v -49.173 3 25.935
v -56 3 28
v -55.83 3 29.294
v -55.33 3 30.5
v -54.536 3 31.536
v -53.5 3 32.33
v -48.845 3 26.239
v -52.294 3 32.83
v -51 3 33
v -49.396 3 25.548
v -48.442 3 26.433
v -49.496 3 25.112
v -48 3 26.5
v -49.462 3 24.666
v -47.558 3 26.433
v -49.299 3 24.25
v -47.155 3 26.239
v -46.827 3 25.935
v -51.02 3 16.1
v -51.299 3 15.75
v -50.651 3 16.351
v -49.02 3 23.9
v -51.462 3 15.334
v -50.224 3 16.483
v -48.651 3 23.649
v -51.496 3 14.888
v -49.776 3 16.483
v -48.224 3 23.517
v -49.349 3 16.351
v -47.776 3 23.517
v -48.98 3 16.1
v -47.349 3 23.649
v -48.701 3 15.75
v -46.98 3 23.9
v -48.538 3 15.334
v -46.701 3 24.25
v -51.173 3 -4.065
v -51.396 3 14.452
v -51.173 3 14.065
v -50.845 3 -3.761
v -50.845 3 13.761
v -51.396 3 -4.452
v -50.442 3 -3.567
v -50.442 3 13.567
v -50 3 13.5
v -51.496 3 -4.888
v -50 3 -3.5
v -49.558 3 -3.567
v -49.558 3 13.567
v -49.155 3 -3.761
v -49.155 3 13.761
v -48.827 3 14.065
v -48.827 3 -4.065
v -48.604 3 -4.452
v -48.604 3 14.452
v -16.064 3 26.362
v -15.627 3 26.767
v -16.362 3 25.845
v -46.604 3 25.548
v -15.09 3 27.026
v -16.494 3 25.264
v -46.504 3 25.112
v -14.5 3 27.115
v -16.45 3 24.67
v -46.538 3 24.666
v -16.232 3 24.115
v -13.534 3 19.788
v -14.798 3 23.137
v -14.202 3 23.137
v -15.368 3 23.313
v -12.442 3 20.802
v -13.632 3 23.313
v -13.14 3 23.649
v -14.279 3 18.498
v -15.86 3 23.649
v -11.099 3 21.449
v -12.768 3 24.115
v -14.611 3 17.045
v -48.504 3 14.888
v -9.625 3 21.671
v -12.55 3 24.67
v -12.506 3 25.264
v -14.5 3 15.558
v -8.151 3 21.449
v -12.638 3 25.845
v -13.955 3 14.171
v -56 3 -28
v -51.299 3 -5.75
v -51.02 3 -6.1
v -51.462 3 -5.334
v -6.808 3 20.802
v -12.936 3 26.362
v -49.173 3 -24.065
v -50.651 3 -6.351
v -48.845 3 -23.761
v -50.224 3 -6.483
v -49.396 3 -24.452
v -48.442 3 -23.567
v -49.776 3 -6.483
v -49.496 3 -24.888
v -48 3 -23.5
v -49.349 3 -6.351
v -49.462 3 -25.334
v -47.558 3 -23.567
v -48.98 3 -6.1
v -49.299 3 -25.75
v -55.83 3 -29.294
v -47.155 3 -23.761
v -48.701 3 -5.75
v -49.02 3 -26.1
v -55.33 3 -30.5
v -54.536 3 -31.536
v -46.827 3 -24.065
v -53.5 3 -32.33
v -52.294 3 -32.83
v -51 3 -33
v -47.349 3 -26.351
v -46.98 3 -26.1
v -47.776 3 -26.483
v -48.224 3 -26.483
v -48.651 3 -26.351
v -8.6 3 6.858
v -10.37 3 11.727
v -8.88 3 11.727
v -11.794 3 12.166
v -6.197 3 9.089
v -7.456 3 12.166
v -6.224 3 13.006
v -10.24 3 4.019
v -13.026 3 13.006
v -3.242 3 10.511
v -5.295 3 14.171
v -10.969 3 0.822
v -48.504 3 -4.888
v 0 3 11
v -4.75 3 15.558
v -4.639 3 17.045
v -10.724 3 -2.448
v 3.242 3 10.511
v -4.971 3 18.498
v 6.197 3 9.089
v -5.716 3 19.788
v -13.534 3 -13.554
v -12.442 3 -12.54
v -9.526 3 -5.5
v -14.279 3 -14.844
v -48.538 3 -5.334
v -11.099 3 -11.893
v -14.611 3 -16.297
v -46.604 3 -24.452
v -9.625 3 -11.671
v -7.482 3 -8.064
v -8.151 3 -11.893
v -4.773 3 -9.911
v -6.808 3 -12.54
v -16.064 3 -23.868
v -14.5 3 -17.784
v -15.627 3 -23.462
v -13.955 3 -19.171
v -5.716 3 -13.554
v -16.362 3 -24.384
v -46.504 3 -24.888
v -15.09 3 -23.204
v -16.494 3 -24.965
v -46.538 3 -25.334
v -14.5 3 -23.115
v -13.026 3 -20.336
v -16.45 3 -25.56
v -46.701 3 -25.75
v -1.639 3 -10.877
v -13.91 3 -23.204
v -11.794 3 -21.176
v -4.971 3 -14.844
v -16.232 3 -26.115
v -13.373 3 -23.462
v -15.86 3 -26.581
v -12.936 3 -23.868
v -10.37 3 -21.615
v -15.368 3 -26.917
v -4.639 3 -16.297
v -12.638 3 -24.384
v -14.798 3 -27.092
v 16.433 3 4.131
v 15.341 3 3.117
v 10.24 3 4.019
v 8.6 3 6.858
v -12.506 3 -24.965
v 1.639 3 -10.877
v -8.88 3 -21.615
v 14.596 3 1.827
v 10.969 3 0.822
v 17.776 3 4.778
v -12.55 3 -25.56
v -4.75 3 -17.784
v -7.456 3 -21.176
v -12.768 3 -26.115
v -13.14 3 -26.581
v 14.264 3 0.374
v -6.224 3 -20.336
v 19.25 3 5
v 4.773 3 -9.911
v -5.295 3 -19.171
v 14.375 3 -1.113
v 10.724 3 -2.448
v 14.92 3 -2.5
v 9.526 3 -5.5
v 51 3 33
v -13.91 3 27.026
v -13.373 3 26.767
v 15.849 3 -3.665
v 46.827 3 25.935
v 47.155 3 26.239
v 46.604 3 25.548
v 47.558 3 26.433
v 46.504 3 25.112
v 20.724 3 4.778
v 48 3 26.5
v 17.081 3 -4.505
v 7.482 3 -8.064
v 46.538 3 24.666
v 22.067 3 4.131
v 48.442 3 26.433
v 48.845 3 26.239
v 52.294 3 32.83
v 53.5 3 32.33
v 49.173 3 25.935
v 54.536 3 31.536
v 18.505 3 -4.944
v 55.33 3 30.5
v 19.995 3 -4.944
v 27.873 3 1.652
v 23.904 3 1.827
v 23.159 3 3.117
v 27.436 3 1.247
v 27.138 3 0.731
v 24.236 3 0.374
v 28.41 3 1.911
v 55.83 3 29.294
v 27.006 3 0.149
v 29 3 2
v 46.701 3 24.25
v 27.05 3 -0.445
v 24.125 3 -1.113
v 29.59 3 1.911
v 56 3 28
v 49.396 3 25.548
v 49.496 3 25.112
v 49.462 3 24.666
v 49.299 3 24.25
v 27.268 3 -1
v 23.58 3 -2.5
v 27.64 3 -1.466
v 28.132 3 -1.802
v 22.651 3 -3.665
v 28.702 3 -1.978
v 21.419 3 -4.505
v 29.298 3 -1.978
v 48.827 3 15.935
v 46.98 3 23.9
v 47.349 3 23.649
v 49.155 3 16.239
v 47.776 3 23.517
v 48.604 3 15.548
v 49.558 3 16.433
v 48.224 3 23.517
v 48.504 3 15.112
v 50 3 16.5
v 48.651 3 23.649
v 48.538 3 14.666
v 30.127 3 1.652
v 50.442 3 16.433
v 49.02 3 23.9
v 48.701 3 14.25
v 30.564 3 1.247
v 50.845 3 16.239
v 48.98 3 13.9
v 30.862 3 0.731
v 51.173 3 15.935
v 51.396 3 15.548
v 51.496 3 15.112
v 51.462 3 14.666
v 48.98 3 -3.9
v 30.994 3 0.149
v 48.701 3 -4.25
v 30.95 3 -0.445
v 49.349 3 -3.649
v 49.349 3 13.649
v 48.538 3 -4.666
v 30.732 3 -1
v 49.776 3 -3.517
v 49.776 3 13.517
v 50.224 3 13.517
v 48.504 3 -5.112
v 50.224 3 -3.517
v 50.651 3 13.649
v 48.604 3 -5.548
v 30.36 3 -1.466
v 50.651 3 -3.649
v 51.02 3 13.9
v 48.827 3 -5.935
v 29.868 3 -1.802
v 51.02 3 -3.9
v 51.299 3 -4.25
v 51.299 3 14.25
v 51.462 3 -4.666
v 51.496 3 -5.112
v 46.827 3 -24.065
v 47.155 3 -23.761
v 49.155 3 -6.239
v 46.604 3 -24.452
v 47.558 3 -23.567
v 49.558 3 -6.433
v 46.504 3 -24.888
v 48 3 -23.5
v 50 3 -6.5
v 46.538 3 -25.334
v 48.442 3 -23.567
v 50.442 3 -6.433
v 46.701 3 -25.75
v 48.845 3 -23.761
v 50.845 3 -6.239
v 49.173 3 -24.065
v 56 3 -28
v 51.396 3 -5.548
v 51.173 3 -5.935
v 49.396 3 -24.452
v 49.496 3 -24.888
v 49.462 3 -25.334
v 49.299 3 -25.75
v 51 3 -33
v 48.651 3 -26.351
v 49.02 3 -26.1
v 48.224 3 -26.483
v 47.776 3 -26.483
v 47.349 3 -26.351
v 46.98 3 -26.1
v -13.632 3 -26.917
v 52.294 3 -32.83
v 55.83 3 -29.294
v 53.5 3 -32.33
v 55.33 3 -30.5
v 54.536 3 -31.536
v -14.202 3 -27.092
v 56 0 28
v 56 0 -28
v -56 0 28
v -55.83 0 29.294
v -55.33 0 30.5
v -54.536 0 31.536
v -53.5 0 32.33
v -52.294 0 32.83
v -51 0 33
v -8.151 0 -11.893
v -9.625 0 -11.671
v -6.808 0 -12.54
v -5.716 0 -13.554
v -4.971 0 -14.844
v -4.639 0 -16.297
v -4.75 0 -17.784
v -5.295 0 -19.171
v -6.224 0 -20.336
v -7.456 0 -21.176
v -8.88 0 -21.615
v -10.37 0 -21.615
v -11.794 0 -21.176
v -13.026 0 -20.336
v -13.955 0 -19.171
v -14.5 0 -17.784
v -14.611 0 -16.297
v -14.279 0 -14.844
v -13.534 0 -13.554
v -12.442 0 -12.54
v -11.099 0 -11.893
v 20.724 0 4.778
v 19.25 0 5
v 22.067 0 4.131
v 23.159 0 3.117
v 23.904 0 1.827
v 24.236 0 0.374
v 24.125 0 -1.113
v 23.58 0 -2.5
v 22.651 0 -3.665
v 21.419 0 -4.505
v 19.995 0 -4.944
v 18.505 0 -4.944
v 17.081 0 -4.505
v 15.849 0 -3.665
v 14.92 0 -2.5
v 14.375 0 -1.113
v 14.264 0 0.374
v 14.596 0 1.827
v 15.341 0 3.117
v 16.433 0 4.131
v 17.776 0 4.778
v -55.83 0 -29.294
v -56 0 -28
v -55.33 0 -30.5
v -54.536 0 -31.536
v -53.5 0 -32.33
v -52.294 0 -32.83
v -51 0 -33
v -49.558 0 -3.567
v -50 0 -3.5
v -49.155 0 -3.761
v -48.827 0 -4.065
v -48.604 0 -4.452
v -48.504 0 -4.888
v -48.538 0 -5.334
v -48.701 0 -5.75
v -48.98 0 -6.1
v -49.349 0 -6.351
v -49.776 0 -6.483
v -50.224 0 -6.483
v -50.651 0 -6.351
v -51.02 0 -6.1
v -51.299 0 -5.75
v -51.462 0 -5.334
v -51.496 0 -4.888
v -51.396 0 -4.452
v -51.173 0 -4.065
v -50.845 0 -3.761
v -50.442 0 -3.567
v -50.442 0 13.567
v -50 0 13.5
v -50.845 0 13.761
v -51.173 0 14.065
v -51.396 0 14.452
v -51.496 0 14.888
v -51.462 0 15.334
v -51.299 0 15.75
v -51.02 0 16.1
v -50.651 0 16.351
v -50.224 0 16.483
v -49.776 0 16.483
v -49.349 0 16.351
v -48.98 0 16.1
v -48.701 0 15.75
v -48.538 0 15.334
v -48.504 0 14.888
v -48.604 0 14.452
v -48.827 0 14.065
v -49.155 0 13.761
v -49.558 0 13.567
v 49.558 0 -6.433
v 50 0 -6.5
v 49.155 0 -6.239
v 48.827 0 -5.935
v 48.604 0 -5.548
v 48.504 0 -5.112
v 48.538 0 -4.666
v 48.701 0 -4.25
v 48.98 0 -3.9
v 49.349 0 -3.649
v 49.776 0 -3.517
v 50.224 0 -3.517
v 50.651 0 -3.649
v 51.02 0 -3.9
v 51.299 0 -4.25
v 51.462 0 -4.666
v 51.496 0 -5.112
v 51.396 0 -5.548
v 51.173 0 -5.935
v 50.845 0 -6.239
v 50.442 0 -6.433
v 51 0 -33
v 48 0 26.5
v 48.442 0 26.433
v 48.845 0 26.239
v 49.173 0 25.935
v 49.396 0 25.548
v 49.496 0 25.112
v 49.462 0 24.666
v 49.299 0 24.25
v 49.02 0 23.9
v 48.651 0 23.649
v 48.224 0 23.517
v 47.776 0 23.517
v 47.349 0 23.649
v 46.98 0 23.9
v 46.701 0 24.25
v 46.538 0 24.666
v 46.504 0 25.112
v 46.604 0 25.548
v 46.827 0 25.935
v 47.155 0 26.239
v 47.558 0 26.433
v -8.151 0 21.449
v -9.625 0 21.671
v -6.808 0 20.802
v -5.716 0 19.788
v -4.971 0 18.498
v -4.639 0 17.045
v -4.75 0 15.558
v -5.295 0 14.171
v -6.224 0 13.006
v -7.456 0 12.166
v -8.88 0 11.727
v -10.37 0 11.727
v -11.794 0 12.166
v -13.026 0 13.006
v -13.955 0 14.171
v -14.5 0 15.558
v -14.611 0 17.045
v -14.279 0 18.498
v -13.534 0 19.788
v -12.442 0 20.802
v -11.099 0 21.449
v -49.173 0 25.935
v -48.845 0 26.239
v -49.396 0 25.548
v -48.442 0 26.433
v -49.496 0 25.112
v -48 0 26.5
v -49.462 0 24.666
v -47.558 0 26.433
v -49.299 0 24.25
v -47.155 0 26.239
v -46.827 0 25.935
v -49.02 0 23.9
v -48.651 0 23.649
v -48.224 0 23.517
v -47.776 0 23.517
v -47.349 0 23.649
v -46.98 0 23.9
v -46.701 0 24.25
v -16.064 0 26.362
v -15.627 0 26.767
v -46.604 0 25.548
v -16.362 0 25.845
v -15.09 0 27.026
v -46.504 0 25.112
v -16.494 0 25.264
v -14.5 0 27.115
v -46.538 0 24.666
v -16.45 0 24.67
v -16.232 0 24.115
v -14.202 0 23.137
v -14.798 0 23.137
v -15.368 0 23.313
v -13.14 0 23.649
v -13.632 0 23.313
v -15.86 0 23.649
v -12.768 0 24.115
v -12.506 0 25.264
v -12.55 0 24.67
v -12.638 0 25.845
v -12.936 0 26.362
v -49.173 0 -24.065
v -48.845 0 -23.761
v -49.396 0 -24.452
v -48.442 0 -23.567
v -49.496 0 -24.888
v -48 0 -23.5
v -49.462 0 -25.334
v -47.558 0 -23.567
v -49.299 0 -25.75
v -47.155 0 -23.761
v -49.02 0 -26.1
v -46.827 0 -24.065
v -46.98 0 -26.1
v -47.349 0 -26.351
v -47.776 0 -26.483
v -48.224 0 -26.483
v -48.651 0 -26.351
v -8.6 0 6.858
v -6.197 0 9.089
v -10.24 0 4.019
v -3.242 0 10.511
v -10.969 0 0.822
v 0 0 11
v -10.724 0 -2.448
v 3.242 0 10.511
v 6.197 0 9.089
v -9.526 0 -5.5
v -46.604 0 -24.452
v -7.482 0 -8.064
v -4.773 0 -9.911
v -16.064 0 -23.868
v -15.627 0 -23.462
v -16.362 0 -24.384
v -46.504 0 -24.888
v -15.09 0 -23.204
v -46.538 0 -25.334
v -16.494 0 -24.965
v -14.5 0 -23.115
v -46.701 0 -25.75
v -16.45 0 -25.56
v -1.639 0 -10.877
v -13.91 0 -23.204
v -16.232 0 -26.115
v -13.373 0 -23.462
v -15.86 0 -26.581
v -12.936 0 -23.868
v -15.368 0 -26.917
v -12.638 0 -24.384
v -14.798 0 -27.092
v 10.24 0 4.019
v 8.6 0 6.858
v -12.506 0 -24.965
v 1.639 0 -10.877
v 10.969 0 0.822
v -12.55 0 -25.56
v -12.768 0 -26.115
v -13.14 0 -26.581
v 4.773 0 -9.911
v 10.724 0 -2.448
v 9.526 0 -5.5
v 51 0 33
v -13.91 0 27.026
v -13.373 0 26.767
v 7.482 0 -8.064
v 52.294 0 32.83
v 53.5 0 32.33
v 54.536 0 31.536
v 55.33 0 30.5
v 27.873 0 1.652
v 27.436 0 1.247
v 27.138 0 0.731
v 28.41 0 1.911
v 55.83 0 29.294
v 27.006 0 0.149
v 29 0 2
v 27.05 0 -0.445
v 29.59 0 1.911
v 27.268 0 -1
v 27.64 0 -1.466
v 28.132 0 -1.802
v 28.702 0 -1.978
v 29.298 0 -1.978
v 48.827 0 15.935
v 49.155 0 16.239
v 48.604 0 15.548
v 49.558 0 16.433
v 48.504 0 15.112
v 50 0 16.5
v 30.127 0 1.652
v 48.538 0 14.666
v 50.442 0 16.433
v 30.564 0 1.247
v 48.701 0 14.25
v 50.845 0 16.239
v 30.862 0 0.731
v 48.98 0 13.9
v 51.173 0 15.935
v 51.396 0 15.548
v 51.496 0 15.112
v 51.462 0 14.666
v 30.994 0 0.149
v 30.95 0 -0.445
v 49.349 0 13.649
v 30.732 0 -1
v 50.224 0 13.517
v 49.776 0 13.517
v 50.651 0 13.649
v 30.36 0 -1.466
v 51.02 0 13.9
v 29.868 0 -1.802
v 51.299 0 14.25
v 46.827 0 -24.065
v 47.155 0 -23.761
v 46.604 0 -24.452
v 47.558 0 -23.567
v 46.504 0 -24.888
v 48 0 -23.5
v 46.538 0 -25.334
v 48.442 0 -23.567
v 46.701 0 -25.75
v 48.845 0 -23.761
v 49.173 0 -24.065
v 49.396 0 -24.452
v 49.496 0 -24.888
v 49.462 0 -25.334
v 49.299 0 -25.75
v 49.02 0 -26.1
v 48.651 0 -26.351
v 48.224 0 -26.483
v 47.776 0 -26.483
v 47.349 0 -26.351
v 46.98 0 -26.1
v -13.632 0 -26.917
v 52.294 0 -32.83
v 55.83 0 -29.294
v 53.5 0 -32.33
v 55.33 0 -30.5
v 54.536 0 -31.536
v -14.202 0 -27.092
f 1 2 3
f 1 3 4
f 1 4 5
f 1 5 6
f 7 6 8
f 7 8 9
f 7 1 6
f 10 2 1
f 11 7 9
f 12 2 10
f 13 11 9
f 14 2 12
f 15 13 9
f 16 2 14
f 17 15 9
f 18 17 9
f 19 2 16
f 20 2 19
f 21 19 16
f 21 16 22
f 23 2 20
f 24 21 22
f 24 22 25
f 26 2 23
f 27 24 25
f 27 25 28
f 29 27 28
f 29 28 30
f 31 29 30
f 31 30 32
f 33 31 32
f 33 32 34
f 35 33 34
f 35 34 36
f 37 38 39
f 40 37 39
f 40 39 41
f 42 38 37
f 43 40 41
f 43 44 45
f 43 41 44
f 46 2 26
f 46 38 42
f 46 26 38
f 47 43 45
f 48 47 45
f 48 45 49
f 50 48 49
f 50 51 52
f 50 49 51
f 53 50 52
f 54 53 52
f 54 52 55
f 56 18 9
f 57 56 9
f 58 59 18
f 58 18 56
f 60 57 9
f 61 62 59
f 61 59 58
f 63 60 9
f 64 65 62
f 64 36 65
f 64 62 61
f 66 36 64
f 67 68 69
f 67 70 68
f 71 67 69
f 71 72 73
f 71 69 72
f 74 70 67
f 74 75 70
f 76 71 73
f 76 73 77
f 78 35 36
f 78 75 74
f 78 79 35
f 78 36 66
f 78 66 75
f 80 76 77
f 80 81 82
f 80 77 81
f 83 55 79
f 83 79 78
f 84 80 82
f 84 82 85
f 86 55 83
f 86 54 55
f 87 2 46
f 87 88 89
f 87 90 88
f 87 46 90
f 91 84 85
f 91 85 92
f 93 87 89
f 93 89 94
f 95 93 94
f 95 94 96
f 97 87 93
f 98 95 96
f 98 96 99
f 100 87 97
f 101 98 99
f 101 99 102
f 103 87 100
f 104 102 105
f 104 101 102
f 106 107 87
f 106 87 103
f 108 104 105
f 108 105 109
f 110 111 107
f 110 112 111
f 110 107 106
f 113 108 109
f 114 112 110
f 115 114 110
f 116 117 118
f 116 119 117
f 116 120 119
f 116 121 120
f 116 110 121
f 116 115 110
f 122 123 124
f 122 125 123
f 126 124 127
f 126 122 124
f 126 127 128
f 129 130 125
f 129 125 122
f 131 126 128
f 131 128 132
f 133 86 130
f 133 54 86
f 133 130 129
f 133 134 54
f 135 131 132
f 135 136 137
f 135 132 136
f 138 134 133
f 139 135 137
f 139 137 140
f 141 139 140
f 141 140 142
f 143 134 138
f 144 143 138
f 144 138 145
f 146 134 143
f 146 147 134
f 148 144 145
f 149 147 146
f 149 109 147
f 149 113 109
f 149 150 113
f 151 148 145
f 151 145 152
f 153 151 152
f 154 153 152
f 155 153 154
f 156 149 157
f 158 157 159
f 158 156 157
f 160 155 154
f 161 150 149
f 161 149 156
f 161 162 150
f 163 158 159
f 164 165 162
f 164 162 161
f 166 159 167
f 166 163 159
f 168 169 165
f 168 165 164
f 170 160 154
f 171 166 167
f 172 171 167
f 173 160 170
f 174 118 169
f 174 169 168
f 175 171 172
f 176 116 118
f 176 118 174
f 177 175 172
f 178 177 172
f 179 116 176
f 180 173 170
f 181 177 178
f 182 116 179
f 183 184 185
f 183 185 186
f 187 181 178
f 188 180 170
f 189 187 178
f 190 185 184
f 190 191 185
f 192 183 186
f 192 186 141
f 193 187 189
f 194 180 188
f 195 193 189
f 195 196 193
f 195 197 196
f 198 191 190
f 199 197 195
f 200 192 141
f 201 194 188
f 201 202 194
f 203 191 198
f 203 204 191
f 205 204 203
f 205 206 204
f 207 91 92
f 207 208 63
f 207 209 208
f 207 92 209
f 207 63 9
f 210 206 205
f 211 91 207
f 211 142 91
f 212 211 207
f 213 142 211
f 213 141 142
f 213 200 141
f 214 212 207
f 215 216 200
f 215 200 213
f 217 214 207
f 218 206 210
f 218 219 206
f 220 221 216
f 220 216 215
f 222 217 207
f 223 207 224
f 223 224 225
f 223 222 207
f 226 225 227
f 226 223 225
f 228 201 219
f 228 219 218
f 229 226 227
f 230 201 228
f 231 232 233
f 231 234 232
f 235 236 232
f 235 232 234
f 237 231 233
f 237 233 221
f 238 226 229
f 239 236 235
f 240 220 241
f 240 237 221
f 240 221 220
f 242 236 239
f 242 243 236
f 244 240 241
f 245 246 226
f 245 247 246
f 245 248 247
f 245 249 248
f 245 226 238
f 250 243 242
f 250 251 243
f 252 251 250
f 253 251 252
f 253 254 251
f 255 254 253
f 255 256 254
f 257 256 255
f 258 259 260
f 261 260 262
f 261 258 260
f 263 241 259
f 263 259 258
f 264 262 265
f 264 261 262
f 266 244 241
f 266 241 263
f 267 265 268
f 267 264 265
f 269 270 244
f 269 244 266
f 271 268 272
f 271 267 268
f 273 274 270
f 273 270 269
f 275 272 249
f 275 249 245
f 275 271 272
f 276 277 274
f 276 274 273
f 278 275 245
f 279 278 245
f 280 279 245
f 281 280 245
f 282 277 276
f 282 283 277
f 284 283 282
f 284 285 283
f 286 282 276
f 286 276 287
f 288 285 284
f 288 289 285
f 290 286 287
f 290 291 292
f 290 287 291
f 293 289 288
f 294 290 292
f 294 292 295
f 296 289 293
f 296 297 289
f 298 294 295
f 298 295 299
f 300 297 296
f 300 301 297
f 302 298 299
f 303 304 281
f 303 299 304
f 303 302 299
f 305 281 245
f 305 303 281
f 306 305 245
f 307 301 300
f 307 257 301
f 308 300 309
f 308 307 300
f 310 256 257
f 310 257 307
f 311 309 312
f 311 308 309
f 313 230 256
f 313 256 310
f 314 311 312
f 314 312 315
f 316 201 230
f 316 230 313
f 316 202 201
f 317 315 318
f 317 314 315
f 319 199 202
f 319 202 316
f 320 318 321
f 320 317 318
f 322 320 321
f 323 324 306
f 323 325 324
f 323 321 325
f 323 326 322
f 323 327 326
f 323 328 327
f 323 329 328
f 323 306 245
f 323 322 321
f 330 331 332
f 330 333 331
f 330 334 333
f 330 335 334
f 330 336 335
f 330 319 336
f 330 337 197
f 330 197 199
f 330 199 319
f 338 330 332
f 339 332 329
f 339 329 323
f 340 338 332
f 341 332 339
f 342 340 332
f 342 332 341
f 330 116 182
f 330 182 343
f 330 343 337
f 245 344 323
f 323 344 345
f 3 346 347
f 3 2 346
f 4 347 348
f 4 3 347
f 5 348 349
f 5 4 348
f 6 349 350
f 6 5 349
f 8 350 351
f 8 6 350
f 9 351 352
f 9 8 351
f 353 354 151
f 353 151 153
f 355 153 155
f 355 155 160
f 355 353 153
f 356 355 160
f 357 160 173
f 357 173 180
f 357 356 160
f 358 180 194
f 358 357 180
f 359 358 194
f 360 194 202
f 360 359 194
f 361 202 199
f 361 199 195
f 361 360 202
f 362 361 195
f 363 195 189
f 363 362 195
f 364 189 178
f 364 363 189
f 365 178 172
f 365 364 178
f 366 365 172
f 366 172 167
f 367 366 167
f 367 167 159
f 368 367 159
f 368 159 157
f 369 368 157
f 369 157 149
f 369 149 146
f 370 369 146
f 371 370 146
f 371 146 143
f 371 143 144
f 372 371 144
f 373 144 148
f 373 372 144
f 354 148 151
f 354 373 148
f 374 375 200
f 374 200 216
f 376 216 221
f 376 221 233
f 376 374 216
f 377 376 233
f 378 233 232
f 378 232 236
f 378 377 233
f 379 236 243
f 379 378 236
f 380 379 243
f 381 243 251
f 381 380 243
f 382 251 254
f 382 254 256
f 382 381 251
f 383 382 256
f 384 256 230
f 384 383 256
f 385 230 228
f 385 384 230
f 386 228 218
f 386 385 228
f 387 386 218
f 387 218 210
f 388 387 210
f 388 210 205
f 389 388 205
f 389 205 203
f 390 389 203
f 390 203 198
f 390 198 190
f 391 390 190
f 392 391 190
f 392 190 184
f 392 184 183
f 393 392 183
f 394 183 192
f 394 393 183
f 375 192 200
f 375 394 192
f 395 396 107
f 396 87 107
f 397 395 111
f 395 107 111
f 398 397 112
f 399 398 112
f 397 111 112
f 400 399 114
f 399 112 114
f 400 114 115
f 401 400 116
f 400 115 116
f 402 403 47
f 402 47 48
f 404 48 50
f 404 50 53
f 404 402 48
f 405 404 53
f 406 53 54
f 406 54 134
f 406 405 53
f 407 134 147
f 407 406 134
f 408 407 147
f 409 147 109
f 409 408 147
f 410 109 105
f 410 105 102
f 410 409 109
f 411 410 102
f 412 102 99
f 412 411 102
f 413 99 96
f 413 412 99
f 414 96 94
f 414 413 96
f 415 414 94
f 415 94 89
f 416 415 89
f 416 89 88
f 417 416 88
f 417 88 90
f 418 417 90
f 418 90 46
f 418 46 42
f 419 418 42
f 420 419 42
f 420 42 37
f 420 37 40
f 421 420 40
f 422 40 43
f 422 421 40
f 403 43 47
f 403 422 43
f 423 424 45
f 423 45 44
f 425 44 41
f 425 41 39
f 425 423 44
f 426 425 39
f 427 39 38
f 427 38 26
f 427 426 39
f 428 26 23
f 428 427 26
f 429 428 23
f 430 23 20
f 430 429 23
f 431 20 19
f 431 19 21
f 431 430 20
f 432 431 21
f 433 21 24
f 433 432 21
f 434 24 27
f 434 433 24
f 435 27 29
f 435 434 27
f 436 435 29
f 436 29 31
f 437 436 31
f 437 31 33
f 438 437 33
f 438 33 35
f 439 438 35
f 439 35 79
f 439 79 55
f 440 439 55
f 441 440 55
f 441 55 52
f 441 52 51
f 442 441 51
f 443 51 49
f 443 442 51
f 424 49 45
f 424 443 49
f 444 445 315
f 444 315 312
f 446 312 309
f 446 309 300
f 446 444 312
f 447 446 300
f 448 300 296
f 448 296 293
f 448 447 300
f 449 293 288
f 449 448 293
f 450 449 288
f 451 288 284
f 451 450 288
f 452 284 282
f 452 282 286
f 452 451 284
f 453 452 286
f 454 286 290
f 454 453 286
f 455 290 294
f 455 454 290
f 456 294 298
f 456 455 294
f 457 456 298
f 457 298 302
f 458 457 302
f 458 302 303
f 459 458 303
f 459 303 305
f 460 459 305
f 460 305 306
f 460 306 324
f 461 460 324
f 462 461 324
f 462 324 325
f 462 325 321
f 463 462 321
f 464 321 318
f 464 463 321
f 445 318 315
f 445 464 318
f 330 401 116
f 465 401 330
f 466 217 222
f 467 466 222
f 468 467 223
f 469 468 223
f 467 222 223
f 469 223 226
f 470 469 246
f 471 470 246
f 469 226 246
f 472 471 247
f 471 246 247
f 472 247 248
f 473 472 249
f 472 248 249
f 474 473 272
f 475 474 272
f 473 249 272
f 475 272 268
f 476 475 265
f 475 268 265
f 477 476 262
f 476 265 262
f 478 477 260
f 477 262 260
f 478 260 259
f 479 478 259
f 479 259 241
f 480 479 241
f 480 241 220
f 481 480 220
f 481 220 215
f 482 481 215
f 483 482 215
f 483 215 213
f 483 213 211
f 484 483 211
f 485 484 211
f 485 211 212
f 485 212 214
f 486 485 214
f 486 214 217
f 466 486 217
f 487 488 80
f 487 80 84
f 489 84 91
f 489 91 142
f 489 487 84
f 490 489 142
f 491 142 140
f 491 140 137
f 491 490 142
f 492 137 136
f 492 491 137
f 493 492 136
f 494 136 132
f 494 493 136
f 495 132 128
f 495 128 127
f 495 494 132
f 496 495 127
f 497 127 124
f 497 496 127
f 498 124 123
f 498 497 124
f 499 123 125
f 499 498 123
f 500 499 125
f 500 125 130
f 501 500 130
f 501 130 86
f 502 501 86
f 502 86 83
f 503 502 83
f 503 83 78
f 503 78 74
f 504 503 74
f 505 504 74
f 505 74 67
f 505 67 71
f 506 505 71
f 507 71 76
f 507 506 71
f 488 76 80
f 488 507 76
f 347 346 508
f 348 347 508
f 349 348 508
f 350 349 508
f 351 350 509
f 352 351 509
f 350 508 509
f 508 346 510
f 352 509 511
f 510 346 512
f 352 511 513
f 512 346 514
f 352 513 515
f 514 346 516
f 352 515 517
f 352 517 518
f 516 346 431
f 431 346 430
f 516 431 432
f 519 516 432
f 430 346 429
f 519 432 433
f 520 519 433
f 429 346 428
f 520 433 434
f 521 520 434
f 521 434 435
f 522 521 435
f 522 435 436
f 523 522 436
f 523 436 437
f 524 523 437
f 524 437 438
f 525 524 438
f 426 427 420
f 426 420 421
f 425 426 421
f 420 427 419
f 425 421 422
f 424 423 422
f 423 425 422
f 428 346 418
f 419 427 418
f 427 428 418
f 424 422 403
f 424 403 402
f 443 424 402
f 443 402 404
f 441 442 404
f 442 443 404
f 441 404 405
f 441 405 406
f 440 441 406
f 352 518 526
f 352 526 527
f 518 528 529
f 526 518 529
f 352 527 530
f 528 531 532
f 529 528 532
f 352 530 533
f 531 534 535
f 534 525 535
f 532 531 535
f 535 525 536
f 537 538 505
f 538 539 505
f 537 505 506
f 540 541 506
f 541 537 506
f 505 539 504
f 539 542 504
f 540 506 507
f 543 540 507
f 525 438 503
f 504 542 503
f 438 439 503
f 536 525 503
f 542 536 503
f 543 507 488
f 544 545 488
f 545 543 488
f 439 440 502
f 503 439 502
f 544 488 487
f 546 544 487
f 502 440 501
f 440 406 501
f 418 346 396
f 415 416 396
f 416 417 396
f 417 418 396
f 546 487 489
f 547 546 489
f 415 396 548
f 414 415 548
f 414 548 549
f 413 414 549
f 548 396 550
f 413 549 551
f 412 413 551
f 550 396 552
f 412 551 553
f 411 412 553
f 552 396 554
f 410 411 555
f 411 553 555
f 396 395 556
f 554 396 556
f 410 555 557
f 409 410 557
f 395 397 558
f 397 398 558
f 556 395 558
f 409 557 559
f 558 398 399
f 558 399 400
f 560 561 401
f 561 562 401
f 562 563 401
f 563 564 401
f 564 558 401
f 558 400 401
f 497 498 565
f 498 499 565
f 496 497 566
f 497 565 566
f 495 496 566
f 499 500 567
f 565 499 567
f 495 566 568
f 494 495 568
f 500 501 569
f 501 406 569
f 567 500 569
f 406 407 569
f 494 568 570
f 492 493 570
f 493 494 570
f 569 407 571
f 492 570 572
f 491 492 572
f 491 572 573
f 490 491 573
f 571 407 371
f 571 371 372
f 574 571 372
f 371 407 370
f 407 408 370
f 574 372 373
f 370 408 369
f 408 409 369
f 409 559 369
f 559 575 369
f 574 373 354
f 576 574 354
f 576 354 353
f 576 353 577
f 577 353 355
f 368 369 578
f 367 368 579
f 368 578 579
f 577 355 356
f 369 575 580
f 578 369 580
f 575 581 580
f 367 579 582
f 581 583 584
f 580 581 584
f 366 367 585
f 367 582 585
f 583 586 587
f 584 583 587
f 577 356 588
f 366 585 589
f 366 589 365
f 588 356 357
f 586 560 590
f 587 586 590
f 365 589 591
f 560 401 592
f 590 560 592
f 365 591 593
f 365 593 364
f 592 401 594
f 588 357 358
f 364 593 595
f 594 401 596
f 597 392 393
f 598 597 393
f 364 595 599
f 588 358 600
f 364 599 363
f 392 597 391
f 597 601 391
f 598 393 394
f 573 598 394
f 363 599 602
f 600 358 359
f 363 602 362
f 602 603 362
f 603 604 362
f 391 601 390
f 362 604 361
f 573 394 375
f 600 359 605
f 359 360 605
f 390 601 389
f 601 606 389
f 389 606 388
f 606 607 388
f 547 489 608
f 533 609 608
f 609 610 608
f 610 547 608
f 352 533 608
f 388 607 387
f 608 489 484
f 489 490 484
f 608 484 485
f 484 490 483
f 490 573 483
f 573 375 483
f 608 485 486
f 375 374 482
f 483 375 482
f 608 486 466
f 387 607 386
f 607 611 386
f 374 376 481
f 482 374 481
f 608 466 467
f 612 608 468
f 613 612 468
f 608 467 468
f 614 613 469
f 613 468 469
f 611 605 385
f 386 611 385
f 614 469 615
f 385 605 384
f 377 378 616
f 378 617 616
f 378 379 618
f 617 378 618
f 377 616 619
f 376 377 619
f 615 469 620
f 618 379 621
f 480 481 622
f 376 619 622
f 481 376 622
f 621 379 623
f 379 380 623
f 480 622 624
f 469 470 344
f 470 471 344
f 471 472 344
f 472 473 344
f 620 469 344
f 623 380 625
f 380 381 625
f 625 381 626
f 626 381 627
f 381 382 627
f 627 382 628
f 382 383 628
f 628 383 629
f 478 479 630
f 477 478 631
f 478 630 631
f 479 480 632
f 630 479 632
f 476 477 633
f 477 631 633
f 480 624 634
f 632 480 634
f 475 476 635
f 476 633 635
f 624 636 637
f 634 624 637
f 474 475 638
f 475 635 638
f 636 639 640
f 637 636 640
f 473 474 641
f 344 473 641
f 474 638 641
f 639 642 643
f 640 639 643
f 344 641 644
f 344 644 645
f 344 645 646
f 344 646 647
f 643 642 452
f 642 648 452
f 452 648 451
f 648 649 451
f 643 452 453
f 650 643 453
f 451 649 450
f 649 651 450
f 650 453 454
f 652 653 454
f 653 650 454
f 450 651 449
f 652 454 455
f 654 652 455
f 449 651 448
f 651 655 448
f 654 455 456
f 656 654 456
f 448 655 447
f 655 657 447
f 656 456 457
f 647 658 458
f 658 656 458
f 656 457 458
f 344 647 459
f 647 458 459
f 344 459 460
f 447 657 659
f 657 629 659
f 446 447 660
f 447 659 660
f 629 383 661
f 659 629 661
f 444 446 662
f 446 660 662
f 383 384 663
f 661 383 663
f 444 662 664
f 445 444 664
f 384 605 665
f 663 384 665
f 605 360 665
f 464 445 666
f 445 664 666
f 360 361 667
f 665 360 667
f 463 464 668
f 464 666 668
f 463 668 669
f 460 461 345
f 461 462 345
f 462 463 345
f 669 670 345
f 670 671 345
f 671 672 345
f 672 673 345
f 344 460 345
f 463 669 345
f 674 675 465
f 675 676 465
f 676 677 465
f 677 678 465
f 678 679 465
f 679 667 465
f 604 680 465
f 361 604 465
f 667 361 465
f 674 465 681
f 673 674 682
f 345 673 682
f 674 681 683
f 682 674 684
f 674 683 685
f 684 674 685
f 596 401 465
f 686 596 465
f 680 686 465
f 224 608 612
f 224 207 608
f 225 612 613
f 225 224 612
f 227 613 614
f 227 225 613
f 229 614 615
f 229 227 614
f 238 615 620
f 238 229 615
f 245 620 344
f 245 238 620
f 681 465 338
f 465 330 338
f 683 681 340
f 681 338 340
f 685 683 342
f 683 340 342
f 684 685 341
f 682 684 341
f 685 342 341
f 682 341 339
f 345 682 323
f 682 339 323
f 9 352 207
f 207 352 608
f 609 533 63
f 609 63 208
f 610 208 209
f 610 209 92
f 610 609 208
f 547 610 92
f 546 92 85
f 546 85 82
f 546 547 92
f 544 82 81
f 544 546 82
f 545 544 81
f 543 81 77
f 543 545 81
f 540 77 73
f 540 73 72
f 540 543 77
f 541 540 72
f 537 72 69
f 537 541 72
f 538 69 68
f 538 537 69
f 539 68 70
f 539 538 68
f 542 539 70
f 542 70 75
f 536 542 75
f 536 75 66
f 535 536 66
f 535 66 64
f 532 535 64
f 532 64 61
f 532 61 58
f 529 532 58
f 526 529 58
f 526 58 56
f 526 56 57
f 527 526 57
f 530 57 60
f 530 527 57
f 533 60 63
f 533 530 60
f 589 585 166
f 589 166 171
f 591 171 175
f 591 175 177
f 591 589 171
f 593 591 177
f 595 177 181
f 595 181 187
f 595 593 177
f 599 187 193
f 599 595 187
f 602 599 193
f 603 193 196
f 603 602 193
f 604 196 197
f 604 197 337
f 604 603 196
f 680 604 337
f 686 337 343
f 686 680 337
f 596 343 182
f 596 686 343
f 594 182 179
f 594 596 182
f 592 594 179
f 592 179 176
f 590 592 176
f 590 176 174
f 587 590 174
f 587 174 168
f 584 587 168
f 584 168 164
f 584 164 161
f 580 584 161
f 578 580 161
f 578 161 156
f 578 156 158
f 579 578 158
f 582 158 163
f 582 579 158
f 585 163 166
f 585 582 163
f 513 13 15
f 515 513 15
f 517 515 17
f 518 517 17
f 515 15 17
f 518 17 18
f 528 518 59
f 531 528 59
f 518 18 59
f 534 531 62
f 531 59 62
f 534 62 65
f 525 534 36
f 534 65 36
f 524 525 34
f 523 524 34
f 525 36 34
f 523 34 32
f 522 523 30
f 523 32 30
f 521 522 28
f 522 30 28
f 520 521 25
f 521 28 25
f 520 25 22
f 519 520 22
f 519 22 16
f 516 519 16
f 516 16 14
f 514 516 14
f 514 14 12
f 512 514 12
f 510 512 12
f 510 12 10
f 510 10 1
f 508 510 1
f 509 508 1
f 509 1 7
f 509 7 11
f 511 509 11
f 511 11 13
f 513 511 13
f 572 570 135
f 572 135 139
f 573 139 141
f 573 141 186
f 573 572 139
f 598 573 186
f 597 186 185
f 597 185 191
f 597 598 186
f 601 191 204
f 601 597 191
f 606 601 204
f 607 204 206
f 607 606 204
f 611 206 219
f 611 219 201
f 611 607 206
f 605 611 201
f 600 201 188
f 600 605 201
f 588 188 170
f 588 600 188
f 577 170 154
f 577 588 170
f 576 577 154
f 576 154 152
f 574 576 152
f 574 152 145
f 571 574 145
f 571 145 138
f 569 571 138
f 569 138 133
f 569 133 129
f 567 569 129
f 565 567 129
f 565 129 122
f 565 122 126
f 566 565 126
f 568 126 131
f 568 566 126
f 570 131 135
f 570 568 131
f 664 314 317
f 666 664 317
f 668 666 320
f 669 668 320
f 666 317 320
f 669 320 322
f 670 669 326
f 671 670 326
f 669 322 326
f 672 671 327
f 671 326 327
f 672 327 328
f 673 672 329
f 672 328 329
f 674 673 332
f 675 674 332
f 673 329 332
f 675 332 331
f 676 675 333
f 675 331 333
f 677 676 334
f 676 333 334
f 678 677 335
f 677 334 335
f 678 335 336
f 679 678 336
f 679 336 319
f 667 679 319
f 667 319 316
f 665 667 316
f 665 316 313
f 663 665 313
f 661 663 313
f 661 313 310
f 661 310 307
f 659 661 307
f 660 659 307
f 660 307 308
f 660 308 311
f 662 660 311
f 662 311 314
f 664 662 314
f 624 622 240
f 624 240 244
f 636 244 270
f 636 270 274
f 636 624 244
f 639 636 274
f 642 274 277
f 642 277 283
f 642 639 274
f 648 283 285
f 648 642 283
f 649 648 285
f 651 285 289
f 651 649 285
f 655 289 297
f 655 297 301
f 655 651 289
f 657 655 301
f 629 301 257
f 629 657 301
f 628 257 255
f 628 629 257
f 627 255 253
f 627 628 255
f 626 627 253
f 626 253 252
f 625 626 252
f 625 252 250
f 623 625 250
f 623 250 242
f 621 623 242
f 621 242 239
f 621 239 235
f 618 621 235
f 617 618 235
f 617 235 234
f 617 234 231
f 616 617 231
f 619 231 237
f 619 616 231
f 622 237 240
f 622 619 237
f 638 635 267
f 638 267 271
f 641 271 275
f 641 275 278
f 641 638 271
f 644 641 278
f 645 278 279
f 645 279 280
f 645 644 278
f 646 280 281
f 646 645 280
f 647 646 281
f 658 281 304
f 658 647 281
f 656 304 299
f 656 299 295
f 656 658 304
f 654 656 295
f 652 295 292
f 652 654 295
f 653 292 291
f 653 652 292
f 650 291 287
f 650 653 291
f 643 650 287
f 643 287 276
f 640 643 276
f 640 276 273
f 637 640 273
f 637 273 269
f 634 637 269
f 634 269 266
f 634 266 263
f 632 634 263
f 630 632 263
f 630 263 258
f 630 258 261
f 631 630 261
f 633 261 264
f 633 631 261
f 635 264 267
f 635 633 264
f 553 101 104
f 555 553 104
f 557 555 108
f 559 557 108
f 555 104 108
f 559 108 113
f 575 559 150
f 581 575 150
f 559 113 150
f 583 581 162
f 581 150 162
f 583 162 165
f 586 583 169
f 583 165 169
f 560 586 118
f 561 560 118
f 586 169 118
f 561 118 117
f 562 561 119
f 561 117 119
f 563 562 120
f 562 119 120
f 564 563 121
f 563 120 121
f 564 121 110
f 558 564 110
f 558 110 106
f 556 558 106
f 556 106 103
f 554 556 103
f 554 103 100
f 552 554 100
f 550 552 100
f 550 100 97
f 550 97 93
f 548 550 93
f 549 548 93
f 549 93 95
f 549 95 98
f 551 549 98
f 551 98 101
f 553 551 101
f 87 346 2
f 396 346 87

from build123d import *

# Parameters (mm, degrees)
SKETCH_1_W          = 112
SKETCH_1_H          = 66
SKETCH_1_R          = 1.5
SKETCH_1_R_2        = 2
SKETCH_1_R_3        = 11
SKETCH_1_R_4        = 5
EXTRUDE_1_DEPTH     = 3
FILLET_1_R          = 5
SKETCH_2_R          = 1.5
CUT_EXTRUDE_1_DEPTH = 10


with BuildPart() as part:
    # 草图1 → 凸台-拉伸1 (new body)
    with BuildSketch(Plane(origin=(0, 0, 0), x_dir=(1, 0, 0), z_dir=(0, 1, 0))):
        Rectangle(SKETCH_1_W, SKETCH_1_H)
        with Locations(Location((-50, 5, 0), (0, 0, 270))):
            Circle(SKETCH_1_R, mode=Mode.SUBTRACT)
        with Locations(Location((-50, -15, 0), (0, 0, 90))):
            Circle(SKETCH_1_R, mode=Mode.SUBTRACT)
        with Locations(Location((50, -15, 0), (0, 0, 270))):
            Circle(SKETCH_1_R, mode=Mode.SUBTRACT)
        with Locations(Location((50, 5, 0), (0, 0, 90))):
            Circle(SKETCH_1_R, mode=Mode.SUBTRACT)
        with Locations(Location((-14.5, 25.11473671, 0), (0, 0, 270))):
            Circle(SKETCH_1_R_2, mode=Mode.SUBTRACT)
        with Locations(Location((29, 0, 0), (0, 0, 270))):
            Circle(SKETCH_1_R_2, mode=Mode.SUBTRACT)
        with Locations(Location((-14.5, -25.11473671, 0), (0, 0, 270))):
            Circle(SKETCH_1_R_2, mode=Mode.SUBTRACT)
        with Locations(Location((0, 0, 0), (0, 0, 270))):
            Circle(SKETCH_1_R_3, mode=Mode.SUBTRACT)
        with Locations(Location((19.25, 0, 0), (0, 0, 270))):
            Circle(SKETCH_1_R_4, mode=Mode.SUBTRACT)
        with Locations(Location((-9.625, -16.670989023, 0), (0, 0, 270))):
            Circle(SKETCH_1_R_4, mode=Mode.SUBTRACT)
        with Locations(Location((-9.625, 16.670989023, 0), (0, 0, 270))):
            Circle(SKETCH_1_R_4, mode=Mode.SUBTRACT)
    extrude(amount=EXTRUDE_1_DEPTH)

    # 圆角1
    fillet_1_edges = [part.edges().sort_by_distance(p)[0] for p in [
        (56, 1.5, 33),
        (-56, 1.5, 33),
        (-56, 1.5, -33),
        (56, 1.5, -33),
    ]]
    fillet(fillet_1_edges, radius=FILLET_1_R)

    # 草图2 → 切除-拉伸1 (cut)
    with BuildSketch(Plane(origin=(0, 3, 0), x_dir=(1, 0, 0), z_dir=(0, 1, 0))):
        with Locations(Location((-48, 25, 0), (0, 0, 270))):
            Circle(SKETCH_2_R)
        with Locations(Location((-48, -25, 0), (0, 0, 270))):
            Circle(SKETCH_2_R)
        with Locations(Location((48, -25, 0), (0, 0, 270))):
            Circle(SKETCH_2_R)
        with Locations(Location((48, 25, 0), (0, 0, 270))):
            Circle(SKETCH_2_R)
    extrude(amount=-CUT_EXTRUDE_1_DEPTH, mode=Mode.SUBTRACT)


solid = part.part
